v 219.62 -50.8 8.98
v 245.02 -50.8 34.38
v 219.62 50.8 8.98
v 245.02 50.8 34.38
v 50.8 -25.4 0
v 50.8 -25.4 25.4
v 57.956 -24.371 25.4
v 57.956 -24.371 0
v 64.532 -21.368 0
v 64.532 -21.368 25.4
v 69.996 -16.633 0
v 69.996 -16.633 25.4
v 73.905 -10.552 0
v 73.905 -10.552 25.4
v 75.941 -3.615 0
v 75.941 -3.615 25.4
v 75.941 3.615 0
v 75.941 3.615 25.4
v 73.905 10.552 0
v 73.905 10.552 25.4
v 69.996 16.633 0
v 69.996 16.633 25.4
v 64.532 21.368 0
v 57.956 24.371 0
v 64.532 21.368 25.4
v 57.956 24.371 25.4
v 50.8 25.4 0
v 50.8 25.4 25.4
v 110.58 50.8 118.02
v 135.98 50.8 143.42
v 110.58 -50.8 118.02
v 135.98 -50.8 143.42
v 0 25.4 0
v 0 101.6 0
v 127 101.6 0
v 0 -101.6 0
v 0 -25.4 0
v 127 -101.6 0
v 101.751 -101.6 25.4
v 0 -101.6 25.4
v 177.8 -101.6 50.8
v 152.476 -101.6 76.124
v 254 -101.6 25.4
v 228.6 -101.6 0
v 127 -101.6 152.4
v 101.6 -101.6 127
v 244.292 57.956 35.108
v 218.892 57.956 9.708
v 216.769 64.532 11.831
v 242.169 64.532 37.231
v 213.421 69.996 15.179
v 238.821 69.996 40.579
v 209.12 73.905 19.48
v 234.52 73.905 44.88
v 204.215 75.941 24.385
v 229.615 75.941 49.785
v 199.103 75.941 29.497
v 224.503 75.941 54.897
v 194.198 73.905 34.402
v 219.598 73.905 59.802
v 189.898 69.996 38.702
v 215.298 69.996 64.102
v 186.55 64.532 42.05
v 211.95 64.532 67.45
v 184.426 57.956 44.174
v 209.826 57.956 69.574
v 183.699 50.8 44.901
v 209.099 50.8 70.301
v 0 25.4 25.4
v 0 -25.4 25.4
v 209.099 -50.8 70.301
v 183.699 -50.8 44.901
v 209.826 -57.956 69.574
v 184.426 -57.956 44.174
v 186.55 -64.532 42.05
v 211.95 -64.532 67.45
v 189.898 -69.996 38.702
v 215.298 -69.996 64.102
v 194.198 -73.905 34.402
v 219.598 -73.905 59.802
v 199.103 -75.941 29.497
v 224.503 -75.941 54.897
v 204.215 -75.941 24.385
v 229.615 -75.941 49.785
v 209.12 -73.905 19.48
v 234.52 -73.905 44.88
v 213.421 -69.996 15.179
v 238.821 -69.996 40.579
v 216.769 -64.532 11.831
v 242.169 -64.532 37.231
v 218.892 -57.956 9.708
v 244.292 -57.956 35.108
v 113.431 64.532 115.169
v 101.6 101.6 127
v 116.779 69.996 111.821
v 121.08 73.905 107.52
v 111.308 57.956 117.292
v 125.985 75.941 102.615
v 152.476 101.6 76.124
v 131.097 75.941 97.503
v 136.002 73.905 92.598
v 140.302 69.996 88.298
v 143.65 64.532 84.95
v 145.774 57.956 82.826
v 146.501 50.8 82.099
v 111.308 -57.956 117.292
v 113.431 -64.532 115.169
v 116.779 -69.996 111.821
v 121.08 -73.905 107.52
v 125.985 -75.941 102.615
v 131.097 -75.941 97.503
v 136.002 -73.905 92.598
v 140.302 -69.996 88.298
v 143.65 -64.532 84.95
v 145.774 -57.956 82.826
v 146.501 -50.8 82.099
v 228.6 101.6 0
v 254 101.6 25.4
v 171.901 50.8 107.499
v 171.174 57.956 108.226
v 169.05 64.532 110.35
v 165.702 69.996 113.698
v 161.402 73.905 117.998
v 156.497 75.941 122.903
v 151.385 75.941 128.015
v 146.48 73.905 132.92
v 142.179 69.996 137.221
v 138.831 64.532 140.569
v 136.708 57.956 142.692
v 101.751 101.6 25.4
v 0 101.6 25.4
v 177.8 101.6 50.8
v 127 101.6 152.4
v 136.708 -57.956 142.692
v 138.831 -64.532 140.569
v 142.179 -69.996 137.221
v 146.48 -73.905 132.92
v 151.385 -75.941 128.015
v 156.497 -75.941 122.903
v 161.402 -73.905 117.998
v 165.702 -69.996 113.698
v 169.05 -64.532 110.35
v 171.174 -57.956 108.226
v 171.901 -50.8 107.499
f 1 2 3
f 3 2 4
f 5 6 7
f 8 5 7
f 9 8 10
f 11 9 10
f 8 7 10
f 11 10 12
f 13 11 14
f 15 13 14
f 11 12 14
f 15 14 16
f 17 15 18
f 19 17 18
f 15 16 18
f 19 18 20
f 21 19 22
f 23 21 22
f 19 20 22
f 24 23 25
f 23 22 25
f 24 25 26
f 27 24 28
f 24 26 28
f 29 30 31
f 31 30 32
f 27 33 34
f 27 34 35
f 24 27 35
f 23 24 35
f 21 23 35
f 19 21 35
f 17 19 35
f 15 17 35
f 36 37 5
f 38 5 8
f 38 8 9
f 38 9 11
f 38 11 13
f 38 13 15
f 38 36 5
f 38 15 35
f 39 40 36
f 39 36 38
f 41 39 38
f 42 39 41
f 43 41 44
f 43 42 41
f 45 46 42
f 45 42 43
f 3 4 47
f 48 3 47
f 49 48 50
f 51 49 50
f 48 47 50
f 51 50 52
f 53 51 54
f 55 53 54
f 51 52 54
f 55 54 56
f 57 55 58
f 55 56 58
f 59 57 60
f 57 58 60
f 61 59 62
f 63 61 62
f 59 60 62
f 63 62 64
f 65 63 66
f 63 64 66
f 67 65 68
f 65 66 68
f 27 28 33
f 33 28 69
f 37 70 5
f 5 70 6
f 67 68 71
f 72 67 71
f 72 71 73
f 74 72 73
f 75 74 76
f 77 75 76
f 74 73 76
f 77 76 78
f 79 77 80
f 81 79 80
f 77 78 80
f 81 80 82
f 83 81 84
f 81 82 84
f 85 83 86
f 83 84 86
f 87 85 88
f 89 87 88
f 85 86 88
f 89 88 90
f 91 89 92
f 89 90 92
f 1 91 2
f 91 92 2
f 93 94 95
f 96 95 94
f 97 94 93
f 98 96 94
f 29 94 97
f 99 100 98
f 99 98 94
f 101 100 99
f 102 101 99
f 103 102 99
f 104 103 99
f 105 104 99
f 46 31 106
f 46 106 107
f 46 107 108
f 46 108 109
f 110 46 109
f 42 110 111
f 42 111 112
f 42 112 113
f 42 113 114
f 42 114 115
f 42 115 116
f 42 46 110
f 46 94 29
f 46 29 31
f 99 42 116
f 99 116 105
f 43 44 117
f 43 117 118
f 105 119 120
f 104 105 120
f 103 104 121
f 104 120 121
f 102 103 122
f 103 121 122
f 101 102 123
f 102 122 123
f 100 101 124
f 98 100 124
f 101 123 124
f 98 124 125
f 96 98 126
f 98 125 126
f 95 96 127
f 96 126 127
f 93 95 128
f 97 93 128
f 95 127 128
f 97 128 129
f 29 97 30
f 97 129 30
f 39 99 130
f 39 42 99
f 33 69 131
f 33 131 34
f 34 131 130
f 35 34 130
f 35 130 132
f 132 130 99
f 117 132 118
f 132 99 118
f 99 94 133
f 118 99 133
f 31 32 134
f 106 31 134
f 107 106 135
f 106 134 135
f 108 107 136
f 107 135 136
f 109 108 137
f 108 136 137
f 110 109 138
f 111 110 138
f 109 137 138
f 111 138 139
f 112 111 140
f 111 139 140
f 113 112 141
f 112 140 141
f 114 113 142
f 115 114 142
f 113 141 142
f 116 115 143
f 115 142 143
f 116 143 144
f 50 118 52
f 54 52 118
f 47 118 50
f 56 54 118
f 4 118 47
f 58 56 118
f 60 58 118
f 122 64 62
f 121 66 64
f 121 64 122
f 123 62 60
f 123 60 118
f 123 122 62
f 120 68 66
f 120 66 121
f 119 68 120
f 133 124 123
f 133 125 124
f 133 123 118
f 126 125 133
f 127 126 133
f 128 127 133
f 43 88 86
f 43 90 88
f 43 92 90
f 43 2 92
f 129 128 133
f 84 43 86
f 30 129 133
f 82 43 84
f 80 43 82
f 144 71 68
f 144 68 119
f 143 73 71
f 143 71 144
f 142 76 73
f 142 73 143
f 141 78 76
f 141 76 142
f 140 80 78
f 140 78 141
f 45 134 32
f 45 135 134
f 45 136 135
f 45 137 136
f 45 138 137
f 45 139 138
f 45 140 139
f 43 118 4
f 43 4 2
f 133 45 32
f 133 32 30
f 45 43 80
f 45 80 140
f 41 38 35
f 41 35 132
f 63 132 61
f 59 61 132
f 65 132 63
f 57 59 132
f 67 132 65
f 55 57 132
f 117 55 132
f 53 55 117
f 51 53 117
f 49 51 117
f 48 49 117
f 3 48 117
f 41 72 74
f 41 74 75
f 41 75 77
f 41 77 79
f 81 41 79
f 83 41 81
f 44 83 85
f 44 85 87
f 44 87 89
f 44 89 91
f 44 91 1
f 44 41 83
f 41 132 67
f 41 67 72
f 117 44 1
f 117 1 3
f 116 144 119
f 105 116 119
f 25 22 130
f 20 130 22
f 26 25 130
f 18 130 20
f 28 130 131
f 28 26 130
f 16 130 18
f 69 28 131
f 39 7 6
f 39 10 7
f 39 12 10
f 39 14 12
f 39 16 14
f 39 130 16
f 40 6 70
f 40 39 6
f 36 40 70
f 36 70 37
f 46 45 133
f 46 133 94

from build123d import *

# Parameters (mm, degrees)
F1_DEPTH = 101.6
F4_DEPTH = 25.401
F5_DEPTH = 76.2


with BuildPart() as f1:
    # F0 (on Front) → F1 (new body, symmetric)
    with BuildSketch(Plane.XZ):
        Polygon((0, 25.4), (0, 0), (127, 0), (177.8, 50.8), (228.6, 0), (254, 25.4), (127, 152.4), (101.6, 127), (152.475678, 76.124322), (101.751356, 25.4), align=None)
    extrude(amount=F1_DEPTH, both=True)

    # F3 (on face) → F4 (cut, through all)
    with BuildSketch(Plane.XY.offset(25.4)):
        with BuildLine():
            Line((50.8, 25.4), (0, 25.4))
            Line((0, 25.4), (0, -25.4))
            Line((0, -25.4), (50.8, -25.4))
            ThreePointArc((50.8, -25.4), (76.2, 0), (50.8, 25.4))
        make_face()
    extrude(amount=-F4_DEPTH, mode=Mode.SUBTRACT)

    # F2 (on face) → F5 (cut)
    with BuildSketch(Plane(origin=(139.7, 0, 139.7), x_dir=(0, 1, 0), z_dir=(0.707107, 0, 0.707107))):
        with BuildLine():
            ThreePointArc((50.8, -45.539488), (76.2, -20.139488), (50.8, 5.260512))
            Line((50.8, 5.260512), (-50.8, 5.260512))
            ThreePointArc((-50.8, 5.260512), (-76.2, -20.139488), (-50.8, -45.539488))
            Line((-50.8, -45.539488), (50.8, -45.539488))
        make_face()
        with BuildLine():
            Line((-50.8, -148.94461), (50.8, -148.94461))
            ThreePointArc((50.8, -148.94461), (76.2, -123.54461), (50.8, -98.14461))
            Line((50.8, -98.14461), (-50.8, -98.14461))
            ThreePointArc((-50.8, -98.14461), (-76.2, -123.54461), (-50.8, -148.94461))
        make_face()
    extrude(amount=-F5_DEPTH, mode=Mode.SUBTRACT)


solid = f1.part
